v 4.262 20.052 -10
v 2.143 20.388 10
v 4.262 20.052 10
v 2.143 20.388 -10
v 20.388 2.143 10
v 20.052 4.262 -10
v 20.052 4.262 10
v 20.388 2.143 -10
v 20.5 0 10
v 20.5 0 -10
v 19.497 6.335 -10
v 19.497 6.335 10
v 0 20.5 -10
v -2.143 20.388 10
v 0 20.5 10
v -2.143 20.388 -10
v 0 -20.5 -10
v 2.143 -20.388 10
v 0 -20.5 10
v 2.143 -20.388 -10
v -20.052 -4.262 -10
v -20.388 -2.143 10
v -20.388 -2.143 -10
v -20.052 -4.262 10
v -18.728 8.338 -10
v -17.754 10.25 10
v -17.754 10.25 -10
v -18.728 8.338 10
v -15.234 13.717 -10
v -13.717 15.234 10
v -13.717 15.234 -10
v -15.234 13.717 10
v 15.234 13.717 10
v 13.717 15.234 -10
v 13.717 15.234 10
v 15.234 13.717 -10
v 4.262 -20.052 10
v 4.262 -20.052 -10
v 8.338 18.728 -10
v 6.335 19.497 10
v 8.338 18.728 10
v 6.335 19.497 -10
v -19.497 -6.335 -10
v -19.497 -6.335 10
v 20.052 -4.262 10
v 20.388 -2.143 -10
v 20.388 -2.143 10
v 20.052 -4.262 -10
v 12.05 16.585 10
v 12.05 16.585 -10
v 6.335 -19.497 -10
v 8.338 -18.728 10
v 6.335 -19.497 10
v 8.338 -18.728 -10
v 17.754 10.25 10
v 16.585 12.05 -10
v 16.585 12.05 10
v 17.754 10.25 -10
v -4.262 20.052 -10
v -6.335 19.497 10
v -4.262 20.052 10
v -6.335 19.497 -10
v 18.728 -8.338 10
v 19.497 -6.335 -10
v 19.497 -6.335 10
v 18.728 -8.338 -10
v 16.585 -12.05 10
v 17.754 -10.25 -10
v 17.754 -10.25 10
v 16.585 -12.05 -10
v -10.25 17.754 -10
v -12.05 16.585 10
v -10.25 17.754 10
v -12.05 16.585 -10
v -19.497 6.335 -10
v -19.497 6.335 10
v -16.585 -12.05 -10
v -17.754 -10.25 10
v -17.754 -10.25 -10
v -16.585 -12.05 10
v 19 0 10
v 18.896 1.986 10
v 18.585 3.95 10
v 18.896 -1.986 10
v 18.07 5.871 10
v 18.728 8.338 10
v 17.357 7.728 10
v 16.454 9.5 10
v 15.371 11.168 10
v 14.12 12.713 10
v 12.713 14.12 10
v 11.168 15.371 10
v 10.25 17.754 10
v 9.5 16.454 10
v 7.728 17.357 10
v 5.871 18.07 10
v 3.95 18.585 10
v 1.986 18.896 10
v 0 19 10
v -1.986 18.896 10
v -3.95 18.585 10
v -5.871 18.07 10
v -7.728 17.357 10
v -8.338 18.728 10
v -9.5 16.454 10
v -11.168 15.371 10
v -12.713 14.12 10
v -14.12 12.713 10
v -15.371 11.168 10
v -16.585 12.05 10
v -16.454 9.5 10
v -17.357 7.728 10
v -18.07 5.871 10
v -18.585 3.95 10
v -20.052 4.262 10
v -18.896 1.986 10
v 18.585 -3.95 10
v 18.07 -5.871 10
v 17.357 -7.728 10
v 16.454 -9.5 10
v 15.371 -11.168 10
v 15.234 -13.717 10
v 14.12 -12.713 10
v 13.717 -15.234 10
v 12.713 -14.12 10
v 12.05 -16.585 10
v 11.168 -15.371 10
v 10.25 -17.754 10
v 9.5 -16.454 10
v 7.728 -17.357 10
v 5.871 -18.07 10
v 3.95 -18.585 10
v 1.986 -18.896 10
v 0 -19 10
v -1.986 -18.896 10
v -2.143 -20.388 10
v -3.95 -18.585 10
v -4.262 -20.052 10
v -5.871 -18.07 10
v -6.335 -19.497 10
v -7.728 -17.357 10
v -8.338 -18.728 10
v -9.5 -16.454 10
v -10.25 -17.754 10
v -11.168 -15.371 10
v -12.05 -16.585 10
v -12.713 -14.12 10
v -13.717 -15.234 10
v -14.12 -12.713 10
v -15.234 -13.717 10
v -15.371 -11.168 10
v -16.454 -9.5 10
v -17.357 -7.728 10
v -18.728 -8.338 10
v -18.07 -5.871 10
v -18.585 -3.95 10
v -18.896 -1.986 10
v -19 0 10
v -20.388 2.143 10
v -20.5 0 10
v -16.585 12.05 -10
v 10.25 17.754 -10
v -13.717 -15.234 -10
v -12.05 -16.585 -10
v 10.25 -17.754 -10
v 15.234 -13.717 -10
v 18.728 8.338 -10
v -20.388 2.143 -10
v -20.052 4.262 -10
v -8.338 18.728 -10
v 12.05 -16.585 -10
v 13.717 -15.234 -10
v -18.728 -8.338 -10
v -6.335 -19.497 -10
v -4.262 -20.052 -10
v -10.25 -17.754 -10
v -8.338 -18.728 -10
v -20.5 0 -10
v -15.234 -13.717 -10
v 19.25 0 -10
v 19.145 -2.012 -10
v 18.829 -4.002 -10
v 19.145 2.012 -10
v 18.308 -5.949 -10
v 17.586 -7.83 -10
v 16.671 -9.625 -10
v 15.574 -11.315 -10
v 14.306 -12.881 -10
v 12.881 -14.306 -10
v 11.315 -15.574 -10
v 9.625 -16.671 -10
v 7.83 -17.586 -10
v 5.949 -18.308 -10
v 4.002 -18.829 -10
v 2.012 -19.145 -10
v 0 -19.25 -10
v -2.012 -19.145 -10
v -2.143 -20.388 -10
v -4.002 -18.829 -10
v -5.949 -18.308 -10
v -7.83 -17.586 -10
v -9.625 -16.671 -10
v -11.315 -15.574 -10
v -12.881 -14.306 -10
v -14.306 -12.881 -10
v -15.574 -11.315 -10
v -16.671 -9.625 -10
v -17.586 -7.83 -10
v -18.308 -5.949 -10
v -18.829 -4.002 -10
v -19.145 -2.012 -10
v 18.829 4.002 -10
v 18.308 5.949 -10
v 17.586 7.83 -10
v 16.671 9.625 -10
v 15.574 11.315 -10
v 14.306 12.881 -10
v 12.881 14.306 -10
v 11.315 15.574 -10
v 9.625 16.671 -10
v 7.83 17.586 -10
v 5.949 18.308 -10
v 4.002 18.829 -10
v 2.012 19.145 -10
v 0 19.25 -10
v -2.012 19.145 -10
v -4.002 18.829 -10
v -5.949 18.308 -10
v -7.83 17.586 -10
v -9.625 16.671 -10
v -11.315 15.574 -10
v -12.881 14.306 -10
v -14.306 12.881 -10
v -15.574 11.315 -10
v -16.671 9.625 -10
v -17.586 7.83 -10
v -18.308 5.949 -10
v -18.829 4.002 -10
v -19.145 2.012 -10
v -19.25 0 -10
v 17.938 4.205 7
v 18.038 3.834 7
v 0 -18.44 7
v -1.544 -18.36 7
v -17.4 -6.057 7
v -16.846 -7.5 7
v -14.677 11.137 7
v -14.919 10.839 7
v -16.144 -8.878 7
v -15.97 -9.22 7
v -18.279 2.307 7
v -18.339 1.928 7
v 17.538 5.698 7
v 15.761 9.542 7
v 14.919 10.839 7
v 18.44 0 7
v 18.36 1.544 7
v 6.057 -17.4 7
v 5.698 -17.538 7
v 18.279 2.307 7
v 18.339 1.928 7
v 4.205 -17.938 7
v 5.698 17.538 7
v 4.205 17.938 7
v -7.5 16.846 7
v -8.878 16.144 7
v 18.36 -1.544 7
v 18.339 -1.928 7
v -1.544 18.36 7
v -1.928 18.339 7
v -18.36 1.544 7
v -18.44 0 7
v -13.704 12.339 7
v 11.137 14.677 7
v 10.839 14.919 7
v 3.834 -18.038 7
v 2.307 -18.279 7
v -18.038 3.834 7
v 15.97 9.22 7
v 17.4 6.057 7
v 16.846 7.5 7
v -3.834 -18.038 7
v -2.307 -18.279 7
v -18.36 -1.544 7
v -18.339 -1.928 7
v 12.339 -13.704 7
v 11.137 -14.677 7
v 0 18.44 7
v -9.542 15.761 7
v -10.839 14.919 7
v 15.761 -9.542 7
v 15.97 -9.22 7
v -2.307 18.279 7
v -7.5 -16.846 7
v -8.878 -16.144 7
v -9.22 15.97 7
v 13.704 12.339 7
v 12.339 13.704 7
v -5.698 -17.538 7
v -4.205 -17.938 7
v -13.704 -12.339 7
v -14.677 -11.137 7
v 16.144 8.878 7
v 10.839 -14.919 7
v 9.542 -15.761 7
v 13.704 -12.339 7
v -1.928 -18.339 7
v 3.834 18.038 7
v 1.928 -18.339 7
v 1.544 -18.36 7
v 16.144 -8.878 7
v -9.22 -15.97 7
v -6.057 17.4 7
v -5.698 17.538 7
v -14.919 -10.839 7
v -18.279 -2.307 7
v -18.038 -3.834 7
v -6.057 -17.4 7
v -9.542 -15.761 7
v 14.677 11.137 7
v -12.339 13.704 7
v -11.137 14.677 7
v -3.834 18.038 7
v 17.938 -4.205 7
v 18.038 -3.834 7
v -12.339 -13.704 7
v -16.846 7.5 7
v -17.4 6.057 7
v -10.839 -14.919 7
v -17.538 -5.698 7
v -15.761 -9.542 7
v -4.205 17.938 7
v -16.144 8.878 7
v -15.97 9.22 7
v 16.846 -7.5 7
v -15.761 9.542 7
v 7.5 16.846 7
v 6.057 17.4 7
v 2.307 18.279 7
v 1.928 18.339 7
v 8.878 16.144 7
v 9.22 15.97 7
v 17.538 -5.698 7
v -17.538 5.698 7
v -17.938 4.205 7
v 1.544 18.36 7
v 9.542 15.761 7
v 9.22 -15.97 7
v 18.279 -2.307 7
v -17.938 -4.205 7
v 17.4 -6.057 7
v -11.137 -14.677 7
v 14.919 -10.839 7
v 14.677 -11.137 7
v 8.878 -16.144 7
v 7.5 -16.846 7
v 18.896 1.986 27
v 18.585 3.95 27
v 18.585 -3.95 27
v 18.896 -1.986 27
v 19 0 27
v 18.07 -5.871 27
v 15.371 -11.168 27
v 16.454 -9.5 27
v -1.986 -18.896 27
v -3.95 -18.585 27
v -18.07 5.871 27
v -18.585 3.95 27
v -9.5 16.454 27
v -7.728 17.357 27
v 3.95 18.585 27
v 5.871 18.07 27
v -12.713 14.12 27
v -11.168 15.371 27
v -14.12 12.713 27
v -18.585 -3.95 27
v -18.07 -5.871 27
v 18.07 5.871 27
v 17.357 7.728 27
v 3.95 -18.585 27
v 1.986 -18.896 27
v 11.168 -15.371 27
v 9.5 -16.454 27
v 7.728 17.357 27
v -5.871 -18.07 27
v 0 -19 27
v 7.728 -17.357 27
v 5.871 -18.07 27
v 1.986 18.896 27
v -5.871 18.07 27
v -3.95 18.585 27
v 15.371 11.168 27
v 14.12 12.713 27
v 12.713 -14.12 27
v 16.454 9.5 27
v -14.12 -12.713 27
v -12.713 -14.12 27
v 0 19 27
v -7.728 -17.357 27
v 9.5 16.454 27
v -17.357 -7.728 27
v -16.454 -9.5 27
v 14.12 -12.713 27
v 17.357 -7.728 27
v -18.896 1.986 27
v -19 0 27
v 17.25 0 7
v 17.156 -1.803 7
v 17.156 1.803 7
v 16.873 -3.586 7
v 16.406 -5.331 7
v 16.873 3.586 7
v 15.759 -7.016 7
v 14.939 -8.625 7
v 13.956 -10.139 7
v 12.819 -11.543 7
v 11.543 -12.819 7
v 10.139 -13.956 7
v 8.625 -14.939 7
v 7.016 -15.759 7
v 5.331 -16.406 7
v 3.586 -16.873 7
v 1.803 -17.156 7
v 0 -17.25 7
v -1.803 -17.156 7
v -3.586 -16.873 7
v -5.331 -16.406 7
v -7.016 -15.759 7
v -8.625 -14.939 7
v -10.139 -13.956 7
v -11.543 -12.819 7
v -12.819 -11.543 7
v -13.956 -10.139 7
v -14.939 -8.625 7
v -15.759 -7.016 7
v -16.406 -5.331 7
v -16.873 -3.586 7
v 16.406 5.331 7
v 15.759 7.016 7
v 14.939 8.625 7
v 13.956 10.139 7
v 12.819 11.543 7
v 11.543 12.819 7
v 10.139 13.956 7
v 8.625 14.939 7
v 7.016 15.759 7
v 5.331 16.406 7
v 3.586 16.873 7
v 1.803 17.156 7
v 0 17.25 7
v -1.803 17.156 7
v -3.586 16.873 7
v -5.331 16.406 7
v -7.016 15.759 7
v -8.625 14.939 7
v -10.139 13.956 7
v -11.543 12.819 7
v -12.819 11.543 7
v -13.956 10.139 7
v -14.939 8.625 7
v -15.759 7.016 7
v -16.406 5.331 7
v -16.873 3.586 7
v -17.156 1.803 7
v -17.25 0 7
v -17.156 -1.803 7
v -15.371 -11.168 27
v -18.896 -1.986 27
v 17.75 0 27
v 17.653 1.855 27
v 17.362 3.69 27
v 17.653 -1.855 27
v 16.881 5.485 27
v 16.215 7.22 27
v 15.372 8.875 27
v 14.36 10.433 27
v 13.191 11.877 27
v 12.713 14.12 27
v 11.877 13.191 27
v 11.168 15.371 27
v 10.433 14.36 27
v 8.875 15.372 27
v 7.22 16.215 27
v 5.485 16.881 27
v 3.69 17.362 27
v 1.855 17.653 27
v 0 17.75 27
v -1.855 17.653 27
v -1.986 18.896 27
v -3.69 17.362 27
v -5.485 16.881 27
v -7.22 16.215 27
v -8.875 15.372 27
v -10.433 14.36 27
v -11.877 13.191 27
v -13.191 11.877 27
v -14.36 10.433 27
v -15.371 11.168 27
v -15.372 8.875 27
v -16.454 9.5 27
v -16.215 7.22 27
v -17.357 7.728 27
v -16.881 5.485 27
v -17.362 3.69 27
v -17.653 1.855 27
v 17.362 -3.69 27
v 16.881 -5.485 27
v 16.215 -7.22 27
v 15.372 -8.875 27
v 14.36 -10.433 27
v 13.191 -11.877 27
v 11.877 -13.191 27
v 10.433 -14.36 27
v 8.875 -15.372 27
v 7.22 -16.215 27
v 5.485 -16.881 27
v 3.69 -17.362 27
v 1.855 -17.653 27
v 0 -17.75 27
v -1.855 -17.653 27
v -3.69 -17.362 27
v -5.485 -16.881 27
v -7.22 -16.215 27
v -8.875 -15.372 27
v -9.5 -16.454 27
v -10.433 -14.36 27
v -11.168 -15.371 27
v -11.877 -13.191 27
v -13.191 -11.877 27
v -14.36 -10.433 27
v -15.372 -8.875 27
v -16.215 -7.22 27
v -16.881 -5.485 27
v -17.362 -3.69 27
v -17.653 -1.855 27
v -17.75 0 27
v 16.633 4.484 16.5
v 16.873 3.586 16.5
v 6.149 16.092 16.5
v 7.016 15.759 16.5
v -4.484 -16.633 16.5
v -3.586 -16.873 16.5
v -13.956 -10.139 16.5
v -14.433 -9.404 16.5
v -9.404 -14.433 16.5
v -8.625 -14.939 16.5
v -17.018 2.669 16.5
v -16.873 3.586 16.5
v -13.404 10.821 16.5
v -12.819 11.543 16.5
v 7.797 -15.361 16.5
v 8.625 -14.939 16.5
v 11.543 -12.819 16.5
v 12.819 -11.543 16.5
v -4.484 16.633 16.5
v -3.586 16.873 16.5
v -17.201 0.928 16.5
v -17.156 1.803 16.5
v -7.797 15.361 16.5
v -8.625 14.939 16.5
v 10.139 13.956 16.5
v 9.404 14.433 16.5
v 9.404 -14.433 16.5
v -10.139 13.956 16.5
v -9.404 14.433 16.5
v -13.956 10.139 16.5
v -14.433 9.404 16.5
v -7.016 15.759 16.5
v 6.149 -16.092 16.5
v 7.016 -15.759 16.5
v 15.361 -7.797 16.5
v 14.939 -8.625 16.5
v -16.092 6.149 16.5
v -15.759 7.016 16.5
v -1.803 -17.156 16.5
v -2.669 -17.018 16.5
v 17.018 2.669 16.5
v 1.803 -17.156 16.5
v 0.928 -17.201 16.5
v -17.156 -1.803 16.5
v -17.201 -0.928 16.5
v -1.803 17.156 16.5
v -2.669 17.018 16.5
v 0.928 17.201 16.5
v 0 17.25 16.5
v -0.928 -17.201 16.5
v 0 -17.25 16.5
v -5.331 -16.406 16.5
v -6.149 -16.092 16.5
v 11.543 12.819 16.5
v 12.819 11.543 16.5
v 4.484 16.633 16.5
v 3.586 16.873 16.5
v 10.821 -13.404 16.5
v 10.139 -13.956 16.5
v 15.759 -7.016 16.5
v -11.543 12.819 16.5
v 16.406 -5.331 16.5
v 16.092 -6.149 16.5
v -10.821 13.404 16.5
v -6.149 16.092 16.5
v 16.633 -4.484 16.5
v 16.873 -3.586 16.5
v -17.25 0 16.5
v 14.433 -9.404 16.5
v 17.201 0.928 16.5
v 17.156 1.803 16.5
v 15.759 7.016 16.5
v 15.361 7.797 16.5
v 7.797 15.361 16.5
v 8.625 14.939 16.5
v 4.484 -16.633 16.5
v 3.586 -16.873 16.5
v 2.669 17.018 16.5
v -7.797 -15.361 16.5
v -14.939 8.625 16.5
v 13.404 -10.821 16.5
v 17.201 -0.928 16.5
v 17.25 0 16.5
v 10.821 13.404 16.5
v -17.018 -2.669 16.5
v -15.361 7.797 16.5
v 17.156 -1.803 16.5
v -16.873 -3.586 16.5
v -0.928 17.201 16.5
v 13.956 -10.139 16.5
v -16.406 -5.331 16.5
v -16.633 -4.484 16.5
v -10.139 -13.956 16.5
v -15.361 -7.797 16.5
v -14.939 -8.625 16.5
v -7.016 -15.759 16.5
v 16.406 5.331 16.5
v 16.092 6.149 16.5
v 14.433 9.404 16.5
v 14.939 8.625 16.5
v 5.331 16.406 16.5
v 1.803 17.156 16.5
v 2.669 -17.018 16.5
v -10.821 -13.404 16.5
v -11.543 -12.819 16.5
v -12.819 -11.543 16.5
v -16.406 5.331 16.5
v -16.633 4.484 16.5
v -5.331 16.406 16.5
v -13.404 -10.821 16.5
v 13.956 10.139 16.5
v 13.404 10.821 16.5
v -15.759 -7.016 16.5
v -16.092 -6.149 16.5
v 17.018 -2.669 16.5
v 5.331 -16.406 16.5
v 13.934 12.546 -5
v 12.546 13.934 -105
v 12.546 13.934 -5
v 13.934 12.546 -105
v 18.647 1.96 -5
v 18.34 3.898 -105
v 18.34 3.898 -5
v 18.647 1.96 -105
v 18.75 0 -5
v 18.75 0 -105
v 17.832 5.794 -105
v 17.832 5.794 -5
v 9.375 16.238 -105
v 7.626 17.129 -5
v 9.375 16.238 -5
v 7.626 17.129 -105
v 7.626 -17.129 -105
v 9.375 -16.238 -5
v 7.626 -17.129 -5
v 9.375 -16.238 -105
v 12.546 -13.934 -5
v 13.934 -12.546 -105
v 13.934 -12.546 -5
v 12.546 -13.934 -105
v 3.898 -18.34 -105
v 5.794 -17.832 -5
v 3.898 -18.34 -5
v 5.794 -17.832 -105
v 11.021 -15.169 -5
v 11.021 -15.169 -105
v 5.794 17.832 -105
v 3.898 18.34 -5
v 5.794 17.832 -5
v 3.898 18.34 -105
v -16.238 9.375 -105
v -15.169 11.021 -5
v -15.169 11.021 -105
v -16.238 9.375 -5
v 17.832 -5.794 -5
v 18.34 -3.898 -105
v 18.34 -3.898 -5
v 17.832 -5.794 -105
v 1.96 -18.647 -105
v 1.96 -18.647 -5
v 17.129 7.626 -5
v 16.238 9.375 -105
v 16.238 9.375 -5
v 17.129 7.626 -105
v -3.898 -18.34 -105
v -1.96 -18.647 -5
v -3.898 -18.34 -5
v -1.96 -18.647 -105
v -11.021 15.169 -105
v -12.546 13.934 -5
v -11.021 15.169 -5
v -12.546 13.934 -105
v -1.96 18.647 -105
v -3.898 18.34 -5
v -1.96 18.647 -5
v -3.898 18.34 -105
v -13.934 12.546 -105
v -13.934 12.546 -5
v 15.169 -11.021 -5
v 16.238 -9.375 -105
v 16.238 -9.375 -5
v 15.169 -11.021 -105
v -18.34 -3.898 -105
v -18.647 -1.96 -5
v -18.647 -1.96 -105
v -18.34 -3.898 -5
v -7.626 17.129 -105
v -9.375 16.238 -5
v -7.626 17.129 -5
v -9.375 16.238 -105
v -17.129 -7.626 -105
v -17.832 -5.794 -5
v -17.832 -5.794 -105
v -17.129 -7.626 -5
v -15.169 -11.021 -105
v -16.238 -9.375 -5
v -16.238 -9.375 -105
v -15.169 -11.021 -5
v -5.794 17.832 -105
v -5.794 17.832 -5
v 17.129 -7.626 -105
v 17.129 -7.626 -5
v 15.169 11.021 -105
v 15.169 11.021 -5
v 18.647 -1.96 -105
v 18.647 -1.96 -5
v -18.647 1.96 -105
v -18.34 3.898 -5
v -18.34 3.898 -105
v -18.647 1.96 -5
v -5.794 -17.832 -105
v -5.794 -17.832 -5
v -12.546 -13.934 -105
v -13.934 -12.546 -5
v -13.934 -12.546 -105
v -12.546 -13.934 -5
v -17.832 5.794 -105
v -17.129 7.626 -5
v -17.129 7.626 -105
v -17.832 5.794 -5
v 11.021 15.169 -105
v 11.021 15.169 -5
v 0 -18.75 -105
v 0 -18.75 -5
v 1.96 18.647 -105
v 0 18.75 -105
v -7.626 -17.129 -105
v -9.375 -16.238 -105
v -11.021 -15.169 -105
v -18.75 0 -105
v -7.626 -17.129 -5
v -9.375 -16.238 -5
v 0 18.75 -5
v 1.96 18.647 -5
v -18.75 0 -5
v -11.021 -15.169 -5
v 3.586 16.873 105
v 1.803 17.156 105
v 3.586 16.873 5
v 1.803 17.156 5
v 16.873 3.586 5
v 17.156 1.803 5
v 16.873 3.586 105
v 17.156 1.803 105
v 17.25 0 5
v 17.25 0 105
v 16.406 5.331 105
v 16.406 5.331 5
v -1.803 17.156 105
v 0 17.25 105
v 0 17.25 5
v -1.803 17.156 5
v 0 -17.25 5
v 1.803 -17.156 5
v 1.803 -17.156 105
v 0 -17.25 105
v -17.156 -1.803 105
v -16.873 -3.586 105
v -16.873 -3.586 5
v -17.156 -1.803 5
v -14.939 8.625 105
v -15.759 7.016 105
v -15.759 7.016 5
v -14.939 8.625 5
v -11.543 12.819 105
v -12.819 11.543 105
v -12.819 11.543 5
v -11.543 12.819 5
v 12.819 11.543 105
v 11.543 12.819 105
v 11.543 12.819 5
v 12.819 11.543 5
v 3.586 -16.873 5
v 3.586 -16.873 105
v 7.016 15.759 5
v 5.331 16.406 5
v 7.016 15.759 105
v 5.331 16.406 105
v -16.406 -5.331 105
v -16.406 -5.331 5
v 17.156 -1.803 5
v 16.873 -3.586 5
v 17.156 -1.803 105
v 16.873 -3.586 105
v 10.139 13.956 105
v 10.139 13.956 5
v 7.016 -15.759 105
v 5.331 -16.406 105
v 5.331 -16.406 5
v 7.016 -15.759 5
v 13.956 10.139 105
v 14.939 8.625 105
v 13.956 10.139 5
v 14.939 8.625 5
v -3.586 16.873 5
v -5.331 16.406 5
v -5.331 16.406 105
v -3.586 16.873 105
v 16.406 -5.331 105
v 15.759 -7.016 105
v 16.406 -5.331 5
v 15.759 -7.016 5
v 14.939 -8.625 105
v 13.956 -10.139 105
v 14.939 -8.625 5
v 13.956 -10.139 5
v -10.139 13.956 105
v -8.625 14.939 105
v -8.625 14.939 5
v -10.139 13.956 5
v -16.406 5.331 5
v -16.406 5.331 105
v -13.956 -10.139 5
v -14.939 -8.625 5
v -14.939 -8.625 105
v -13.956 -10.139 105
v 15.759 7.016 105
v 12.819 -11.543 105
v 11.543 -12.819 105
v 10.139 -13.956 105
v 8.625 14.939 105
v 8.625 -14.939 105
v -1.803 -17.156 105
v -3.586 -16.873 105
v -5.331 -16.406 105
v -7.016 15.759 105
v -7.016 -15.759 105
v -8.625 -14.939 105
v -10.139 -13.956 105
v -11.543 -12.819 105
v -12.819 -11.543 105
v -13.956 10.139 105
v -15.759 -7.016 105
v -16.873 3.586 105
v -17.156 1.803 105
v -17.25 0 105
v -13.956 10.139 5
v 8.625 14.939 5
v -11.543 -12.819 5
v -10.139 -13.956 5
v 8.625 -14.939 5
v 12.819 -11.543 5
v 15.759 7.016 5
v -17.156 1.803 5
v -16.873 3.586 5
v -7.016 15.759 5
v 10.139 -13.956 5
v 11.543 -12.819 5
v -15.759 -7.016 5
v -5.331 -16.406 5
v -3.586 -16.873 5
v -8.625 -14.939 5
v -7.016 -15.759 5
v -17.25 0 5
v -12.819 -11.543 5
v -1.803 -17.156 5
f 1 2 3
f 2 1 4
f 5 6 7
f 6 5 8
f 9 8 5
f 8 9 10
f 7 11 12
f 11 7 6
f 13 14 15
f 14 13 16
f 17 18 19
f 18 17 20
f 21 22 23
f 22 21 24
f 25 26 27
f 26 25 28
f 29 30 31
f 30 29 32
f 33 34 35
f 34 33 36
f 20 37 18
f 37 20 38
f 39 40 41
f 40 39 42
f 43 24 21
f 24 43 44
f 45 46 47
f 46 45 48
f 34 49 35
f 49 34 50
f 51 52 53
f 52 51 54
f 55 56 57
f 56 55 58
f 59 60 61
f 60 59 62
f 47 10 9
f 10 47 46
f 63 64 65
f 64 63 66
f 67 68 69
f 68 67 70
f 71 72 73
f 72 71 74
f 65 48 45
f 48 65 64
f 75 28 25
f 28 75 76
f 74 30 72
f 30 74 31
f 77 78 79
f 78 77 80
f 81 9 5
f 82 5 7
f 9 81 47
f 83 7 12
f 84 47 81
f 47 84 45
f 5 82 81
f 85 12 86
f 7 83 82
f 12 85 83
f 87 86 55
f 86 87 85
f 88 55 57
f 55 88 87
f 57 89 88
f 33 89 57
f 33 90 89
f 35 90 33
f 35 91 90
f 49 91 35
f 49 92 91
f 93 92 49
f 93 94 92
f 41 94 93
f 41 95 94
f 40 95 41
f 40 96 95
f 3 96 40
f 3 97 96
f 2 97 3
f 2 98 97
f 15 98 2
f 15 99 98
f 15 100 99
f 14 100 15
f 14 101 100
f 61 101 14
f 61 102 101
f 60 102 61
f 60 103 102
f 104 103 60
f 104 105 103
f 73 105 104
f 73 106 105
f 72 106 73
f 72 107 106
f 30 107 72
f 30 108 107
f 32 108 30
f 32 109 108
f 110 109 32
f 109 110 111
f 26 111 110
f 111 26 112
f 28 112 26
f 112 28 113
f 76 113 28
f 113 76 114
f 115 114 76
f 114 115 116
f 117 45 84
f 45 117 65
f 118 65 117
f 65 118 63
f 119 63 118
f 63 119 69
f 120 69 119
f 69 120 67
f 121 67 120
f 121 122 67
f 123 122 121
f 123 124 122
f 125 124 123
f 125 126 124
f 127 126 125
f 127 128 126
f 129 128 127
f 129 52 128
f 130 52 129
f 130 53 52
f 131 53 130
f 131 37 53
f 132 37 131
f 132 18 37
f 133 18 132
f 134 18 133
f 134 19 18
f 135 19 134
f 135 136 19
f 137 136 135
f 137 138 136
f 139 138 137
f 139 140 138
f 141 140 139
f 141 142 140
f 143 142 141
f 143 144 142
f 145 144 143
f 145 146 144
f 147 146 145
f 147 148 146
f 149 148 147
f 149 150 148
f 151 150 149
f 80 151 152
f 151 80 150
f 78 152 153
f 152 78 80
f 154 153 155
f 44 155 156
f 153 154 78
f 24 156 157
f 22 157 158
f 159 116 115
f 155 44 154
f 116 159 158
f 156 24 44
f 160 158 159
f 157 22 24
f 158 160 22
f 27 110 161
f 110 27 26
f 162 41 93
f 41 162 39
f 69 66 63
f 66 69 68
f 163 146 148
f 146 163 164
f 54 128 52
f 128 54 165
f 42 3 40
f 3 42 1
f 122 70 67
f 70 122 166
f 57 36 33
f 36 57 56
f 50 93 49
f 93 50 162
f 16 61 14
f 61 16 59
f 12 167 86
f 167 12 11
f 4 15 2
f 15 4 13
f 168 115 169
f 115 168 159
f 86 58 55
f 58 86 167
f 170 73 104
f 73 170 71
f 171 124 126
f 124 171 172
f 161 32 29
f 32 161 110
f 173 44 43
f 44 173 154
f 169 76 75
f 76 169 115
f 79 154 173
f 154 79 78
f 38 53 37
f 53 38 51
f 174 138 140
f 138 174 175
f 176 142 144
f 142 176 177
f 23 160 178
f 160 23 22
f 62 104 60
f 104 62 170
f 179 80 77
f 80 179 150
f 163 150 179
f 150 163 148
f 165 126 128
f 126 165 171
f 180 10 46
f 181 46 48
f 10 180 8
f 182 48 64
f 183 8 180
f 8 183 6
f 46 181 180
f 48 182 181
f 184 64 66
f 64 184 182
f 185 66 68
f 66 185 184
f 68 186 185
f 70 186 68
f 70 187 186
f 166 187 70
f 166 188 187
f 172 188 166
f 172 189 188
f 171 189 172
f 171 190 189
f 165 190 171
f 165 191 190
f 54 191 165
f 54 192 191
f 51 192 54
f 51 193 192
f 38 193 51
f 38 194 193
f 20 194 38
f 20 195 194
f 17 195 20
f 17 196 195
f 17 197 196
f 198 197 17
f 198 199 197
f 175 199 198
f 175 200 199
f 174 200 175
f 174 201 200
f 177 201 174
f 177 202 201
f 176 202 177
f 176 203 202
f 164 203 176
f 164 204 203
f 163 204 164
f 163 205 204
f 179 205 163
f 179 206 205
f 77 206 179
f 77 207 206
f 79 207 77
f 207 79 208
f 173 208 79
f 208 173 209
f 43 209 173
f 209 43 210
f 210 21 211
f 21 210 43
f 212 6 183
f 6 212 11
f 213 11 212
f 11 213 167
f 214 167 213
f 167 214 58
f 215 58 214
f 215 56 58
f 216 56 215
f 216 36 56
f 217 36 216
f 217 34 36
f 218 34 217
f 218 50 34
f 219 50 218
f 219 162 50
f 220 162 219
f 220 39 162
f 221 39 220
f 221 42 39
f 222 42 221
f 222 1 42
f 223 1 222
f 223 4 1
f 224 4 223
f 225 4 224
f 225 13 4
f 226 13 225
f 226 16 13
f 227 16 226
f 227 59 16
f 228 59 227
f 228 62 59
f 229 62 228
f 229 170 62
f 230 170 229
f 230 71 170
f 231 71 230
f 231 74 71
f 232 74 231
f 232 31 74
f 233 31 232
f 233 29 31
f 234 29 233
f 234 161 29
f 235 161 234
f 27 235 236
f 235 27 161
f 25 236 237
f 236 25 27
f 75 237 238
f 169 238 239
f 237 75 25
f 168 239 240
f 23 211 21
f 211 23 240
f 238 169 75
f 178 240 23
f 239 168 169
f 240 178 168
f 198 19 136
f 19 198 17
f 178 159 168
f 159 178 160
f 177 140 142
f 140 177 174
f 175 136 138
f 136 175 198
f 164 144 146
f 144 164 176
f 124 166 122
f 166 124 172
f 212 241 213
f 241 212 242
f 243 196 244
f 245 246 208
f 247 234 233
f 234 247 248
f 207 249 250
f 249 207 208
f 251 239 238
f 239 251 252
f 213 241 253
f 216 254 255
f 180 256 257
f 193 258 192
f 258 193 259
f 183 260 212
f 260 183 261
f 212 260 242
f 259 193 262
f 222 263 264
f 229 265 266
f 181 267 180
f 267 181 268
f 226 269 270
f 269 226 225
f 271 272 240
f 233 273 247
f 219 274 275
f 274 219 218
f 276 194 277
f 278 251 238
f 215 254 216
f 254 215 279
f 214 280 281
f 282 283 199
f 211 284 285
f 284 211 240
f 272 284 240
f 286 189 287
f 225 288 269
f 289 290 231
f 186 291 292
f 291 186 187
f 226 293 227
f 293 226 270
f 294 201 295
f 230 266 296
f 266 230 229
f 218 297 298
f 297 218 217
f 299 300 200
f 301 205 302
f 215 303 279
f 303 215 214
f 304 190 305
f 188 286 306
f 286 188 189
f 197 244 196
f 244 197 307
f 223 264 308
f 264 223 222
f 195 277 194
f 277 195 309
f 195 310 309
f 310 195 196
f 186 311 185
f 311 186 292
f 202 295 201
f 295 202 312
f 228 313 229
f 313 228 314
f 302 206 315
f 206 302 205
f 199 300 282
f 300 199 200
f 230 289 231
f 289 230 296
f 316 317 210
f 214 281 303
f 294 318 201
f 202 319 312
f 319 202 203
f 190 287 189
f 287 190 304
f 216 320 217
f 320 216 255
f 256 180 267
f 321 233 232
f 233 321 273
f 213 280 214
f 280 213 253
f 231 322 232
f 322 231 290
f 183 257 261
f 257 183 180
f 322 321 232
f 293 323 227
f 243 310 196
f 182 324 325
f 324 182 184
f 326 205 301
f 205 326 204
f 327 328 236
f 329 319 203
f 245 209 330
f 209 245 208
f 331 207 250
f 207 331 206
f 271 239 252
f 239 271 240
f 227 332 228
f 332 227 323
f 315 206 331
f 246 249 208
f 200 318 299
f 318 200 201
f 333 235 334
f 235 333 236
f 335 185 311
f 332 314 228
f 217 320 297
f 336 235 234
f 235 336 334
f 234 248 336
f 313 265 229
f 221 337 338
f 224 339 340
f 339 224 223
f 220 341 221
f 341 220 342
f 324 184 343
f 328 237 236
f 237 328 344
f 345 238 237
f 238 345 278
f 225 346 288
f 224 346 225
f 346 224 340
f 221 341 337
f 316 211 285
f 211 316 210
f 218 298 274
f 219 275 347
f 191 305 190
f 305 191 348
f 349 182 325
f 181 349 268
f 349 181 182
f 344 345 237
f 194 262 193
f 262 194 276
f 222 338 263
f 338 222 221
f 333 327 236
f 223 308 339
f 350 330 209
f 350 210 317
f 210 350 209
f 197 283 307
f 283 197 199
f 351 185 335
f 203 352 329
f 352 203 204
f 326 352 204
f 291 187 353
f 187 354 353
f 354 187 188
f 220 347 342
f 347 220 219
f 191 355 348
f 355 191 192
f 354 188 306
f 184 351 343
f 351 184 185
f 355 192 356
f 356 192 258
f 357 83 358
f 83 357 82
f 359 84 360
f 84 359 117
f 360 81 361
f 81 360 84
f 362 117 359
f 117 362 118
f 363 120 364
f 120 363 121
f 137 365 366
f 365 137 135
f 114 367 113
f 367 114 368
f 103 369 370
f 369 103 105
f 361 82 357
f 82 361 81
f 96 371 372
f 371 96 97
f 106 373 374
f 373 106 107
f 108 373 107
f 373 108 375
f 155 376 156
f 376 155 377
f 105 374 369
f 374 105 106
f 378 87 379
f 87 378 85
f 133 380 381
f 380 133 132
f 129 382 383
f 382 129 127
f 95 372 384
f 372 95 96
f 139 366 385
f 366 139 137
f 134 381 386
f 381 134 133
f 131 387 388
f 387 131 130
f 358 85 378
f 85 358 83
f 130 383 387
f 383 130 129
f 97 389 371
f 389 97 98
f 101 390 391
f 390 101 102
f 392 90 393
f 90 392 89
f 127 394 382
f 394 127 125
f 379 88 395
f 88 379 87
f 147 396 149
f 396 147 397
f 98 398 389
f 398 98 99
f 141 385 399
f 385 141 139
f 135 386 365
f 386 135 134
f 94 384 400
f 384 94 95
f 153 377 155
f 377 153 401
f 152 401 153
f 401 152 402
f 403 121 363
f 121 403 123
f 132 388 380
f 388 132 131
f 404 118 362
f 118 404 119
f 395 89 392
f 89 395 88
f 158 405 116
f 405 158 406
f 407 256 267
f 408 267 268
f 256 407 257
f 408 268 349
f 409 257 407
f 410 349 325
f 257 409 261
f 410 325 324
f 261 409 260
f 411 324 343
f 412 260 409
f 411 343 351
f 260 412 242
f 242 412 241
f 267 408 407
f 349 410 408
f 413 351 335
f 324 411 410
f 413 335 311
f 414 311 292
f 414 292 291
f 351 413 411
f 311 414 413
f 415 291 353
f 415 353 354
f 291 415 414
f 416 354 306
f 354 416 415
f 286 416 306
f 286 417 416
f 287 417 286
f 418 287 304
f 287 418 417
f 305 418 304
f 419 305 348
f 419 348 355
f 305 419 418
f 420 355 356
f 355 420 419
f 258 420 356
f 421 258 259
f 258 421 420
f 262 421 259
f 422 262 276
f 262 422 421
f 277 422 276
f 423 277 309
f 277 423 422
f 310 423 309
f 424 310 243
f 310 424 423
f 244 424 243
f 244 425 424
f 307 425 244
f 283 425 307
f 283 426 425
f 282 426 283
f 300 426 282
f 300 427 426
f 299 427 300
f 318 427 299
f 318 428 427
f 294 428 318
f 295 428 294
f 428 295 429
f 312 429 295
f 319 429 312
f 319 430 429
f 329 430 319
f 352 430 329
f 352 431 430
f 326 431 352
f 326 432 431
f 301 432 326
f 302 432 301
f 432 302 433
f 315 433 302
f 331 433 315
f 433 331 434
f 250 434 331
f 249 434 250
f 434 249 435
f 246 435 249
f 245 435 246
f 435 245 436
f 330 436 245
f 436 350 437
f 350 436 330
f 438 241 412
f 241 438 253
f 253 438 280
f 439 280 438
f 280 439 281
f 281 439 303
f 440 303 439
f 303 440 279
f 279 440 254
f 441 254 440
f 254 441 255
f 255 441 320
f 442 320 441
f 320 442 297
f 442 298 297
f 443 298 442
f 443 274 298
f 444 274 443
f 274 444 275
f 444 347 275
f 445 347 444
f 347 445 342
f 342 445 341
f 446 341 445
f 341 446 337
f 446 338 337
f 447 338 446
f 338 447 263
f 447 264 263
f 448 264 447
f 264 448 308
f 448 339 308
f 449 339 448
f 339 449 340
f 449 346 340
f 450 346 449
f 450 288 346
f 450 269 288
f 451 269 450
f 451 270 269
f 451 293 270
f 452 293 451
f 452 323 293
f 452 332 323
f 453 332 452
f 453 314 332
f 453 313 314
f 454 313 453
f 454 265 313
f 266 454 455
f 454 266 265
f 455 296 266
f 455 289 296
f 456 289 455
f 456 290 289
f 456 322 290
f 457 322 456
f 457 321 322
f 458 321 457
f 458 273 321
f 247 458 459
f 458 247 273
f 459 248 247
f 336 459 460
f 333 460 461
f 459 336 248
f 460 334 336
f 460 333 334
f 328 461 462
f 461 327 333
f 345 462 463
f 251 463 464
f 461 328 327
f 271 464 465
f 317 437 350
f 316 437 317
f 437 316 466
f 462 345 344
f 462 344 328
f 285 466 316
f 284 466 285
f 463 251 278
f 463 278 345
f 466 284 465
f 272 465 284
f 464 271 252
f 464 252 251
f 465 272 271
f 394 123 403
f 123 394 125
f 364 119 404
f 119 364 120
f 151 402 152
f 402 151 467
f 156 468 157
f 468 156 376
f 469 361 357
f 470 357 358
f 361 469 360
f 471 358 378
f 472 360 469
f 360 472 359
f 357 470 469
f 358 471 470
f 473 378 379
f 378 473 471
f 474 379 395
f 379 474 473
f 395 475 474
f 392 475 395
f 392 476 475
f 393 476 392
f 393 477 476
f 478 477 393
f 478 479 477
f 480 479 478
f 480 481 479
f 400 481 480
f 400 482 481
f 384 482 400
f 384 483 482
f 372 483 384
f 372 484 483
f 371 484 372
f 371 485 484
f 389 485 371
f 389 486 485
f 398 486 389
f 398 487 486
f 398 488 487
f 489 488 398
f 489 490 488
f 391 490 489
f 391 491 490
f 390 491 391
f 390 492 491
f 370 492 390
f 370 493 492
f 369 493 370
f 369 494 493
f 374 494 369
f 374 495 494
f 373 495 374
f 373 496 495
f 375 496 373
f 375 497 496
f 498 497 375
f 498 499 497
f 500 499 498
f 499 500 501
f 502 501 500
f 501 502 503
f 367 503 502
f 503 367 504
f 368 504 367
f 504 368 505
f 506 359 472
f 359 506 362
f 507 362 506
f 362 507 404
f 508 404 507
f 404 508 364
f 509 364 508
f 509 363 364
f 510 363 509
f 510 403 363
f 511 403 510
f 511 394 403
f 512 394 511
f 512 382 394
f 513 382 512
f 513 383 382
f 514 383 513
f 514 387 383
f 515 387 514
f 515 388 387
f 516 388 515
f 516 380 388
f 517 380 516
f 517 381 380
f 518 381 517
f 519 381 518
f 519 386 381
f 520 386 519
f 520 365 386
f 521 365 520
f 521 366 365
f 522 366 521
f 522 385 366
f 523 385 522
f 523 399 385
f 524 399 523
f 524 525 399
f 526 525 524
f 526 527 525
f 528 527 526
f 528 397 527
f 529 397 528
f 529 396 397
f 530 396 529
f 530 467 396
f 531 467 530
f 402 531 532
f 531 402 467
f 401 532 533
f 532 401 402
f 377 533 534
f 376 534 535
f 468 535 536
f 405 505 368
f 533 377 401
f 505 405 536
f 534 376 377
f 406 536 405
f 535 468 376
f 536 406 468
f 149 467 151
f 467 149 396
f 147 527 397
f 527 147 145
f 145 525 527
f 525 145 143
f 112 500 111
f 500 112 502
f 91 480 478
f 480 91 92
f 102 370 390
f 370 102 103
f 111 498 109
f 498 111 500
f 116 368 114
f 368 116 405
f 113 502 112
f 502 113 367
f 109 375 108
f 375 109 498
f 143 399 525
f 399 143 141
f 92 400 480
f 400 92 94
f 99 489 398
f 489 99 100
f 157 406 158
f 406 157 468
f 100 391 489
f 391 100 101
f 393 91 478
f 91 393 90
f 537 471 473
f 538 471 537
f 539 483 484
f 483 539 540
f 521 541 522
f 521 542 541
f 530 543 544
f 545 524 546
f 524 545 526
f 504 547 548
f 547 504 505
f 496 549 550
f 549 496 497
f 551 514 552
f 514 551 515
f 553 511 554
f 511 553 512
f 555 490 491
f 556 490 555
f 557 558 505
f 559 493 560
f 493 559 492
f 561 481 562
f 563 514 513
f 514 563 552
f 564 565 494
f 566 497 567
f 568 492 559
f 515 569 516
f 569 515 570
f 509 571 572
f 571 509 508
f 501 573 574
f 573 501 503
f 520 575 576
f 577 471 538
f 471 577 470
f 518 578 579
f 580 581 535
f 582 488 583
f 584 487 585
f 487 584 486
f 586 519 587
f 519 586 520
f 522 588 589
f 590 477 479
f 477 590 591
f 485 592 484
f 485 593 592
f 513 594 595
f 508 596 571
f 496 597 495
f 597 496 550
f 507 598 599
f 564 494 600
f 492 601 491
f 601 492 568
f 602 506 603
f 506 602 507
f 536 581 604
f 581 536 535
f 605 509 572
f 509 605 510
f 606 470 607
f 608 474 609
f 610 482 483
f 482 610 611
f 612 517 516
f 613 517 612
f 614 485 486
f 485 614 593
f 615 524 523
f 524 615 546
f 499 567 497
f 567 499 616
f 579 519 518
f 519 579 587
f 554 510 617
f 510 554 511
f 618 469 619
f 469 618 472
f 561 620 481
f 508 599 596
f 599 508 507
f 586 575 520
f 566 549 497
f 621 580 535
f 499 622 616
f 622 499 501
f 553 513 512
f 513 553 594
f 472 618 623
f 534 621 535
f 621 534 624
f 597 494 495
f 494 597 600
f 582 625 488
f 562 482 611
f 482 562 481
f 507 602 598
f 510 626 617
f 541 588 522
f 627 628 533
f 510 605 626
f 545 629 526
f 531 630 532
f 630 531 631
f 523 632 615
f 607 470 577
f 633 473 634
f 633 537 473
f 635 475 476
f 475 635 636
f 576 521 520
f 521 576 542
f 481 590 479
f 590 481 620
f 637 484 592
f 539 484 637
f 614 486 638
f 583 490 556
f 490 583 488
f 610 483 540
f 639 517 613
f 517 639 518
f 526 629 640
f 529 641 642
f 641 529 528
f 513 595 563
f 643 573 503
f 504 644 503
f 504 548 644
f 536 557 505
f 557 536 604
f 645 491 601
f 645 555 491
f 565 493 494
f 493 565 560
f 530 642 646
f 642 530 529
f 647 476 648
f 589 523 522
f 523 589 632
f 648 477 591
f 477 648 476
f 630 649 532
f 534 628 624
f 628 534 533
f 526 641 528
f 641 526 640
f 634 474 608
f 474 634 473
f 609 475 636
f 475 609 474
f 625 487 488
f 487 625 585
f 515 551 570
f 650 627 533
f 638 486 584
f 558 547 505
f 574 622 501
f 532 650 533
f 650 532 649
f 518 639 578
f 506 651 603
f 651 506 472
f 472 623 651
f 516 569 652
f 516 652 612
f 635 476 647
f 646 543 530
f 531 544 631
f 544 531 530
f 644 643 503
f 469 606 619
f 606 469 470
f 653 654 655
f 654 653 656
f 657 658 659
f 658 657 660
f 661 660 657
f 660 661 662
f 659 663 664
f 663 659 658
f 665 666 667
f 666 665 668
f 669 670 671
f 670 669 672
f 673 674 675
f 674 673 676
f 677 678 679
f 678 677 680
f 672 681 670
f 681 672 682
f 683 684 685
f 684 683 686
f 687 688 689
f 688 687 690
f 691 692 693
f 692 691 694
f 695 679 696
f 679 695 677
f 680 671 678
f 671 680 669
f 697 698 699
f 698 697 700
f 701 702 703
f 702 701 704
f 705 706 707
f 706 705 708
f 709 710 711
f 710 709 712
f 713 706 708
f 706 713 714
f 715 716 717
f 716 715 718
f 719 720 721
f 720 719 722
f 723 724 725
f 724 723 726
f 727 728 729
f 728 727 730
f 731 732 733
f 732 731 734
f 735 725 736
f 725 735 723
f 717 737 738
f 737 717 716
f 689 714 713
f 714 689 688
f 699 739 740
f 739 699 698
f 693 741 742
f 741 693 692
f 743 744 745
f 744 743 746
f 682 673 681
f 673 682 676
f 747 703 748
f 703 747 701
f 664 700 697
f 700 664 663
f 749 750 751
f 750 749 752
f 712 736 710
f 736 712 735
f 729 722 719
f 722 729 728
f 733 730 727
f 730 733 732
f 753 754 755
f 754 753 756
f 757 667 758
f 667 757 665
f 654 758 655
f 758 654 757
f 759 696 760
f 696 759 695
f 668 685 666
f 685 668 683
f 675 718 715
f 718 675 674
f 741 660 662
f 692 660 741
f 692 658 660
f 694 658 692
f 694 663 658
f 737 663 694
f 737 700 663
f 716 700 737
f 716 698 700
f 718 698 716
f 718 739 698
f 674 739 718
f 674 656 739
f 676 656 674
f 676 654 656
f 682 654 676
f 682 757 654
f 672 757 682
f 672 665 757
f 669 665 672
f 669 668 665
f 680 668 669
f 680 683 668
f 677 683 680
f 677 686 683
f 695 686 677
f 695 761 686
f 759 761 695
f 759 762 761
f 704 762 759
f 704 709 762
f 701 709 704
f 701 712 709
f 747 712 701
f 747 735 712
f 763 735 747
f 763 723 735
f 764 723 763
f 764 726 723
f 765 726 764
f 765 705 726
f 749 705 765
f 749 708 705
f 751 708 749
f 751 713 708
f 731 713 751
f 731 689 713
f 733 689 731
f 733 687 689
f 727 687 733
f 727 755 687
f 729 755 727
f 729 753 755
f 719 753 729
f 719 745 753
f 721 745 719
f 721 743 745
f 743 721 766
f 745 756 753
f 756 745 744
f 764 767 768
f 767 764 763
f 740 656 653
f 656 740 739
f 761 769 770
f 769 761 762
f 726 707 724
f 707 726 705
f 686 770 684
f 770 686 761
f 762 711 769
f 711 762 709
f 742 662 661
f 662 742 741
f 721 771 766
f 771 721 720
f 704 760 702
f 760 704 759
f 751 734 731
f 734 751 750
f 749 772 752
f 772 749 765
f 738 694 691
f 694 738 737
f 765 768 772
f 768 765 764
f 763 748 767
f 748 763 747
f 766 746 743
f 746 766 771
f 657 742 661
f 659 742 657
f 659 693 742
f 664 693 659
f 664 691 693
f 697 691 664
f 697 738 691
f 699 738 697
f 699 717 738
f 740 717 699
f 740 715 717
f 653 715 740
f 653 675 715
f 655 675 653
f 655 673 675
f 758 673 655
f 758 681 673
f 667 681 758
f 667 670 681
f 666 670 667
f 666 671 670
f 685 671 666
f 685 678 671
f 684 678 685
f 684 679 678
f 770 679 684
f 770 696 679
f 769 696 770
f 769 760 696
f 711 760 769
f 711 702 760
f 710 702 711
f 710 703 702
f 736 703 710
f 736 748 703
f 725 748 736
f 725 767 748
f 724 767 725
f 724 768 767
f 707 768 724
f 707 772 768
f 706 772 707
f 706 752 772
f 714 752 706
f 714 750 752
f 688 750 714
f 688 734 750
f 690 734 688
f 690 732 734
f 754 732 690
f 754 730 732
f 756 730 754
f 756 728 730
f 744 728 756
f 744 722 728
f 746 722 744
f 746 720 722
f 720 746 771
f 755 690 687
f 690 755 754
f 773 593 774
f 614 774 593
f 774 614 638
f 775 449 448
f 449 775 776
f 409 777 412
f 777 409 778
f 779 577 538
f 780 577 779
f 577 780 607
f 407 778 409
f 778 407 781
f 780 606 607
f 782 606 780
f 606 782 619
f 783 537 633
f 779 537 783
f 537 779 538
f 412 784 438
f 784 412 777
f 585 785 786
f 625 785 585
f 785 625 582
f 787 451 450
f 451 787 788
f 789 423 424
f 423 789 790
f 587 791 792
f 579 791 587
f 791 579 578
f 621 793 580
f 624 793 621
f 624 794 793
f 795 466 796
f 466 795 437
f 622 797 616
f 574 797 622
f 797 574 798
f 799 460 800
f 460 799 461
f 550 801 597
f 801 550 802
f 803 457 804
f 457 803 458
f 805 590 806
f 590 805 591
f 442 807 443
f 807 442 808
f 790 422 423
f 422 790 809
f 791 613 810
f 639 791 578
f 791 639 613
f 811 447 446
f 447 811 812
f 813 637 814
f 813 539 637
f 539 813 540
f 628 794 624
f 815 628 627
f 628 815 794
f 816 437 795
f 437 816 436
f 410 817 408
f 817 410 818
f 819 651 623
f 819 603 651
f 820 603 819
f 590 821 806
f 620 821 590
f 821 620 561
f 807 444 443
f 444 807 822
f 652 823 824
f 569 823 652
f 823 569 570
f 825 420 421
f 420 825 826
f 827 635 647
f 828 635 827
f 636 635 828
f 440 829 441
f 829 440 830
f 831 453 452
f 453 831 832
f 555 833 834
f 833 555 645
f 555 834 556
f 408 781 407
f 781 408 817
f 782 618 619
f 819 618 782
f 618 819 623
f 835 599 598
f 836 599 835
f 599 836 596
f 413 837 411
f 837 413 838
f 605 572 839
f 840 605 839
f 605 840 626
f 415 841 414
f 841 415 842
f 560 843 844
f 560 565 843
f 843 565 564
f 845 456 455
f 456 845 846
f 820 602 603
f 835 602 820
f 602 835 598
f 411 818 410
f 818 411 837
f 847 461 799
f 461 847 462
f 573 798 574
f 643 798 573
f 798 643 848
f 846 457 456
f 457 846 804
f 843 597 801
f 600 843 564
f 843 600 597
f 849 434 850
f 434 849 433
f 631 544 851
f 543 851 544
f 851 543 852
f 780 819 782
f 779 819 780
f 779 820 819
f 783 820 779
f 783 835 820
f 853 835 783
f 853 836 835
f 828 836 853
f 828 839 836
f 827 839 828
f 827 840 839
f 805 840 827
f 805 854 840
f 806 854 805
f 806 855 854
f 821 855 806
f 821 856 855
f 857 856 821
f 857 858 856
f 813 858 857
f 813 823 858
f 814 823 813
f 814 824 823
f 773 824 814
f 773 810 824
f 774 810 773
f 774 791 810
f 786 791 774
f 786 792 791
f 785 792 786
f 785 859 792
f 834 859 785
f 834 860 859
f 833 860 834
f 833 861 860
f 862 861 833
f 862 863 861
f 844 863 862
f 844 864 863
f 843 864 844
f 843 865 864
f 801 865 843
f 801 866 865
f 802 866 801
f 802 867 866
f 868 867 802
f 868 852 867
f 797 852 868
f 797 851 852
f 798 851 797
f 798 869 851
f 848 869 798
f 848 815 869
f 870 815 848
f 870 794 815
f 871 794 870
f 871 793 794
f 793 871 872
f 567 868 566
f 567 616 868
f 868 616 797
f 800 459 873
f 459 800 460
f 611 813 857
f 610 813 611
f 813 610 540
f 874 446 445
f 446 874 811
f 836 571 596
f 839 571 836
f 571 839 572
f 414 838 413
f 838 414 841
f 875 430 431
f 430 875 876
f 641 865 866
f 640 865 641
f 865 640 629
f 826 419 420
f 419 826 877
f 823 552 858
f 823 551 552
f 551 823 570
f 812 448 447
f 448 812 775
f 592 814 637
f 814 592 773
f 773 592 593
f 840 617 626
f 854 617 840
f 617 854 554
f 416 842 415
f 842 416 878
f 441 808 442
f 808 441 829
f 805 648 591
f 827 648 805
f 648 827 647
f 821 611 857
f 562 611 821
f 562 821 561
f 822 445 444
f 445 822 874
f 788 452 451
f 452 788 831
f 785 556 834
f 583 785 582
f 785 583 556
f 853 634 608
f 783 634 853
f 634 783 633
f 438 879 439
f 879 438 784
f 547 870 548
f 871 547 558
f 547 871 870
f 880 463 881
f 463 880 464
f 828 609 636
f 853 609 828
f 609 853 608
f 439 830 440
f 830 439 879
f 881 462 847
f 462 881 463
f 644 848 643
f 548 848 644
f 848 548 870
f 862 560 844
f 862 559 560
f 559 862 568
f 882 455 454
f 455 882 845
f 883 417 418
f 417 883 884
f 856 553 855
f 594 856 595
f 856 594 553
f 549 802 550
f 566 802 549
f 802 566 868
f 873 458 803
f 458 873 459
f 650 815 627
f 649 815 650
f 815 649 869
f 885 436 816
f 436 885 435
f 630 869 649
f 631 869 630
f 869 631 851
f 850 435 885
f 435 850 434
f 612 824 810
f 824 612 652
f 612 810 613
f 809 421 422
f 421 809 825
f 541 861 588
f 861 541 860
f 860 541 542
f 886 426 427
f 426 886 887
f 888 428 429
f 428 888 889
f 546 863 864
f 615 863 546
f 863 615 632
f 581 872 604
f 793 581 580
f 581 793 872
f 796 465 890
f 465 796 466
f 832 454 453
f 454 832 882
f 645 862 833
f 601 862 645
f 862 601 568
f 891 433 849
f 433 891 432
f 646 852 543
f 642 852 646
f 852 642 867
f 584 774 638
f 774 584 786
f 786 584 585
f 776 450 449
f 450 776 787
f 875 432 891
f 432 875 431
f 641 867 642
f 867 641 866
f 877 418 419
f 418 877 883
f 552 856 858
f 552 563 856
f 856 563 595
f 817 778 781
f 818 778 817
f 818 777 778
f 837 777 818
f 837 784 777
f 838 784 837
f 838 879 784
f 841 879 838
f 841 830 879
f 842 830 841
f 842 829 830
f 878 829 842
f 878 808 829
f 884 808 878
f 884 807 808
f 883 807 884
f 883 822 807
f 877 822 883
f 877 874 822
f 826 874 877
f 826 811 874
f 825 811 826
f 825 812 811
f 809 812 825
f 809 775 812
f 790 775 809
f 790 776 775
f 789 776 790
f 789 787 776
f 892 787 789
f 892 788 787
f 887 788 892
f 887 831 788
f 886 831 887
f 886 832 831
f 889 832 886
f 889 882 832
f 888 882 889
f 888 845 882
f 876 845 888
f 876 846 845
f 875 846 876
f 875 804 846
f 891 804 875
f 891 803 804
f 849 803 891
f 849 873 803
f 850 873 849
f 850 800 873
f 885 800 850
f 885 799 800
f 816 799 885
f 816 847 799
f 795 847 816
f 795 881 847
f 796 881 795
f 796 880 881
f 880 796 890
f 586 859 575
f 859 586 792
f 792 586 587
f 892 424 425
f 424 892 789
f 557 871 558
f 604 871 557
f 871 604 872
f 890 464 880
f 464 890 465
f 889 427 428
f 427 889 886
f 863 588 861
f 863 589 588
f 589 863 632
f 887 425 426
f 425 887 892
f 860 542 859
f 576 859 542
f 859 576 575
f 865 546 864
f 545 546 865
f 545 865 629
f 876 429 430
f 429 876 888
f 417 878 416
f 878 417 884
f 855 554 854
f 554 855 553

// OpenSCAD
//
// Fraesabsauger
//

$fn=60;

G=37.5;
K=34.5;
H=20;
W=3.5;

Staubrohr=true;
Buerstenrohr=true;

module Konus(GG,HH){
    
    hull() {
        translate([0,0,-HH/2])
        cylinder(d=GG+1,h=1,center=true);
        translate([0,0,HH/2])
        cylinder(d=GG-1,h=1,center=true);
    }
}

module Adapter(GG,HH) {
    
    difference() {
        cylinder(d=GG+W,h=HH,center=true);
        Konus(GG,HH+1);
    }
}


module Staubsaugeradapter() {
    Adapter(G,H);               // grosser Adapter
    color("Gray")
    translate([0,0,H-3])
    rotate([180,0,0])
    Adapter(K,H);               // kleiner Adapter
}

Staubsaugeradapter();

if (Staubrohr) color("Green")
translate([0,0,-105])
cylinder(d=G,h=100);

if (Buerstenrohr) color("Blue")
translate([0,0,5])
cylinder(d=K,h=100);
